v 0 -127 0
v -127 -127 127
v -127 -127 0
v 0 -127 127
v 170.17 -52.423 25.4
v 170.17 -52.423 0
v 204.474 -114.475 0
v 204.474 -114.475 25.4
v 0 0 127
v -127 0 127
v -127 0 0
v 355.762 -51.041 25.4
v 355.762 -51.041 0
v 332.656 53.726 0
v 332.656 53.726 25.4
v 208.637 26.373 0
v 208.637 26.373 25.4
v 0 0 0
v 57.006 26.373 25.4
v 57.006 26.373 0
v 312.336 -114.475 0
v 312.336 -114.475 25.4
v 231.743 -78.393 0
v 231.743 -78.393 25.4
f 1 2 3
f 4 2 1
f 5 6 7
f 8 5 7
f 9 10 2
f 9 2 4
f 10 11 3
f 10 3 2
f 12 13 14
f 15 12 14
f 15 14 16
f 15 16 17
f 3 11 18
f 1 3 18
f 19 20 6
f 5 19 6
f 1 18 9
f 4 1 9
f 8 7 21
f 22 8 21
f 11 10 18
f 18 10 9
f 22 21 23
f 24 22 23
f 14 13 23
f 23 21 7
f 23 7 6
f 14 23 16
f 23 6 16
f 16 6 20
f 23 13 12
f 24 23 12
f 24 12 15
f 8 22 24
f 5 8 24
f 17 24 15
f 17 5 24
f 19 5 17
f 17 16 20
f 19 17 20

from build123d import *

# Parameters (mm, degrees)
F0_W     = 127
F0_H     = 127
F1_DEPTH = 127
F3_DEPTH = 25.4
F4_DEPTH = 127


with BuildPart() as f1:
    # F0 (on Front) → F1 (new body)
    with BuildSketch(Plane.XZ):
        with Locations((-63.5, 63.5)):
            Rectangle(F0_W, F0_H)
    extrude(amount=F1_DEPTH)


with BuildPart() as f3:
    # F2 (on Top) → F3 (new body)
    with BuildSketch(Plane.XY):
        Polygon((208.6365669966, 26.3727381825), (57.0057630539, 26.3727381825), (170.169994235, -52.423171699), (204.4744044542, -114.4747436047), (312.3362958431, -114.4747436047), (231.7429929972, -78.3934667706), align=None)
    extrude(amount=F3_DEPTH)

    # F4 (add): a face of the model
    f4_faces = [f3.faces().sort_by_distance(p)[0] for p in [
        (220.1897799969, -26.0103642941, 12.7),
    ]]
    extrude(f4_faces, amount=F4_DEPTH)


solid = Compound([f1.part, f3.part])
